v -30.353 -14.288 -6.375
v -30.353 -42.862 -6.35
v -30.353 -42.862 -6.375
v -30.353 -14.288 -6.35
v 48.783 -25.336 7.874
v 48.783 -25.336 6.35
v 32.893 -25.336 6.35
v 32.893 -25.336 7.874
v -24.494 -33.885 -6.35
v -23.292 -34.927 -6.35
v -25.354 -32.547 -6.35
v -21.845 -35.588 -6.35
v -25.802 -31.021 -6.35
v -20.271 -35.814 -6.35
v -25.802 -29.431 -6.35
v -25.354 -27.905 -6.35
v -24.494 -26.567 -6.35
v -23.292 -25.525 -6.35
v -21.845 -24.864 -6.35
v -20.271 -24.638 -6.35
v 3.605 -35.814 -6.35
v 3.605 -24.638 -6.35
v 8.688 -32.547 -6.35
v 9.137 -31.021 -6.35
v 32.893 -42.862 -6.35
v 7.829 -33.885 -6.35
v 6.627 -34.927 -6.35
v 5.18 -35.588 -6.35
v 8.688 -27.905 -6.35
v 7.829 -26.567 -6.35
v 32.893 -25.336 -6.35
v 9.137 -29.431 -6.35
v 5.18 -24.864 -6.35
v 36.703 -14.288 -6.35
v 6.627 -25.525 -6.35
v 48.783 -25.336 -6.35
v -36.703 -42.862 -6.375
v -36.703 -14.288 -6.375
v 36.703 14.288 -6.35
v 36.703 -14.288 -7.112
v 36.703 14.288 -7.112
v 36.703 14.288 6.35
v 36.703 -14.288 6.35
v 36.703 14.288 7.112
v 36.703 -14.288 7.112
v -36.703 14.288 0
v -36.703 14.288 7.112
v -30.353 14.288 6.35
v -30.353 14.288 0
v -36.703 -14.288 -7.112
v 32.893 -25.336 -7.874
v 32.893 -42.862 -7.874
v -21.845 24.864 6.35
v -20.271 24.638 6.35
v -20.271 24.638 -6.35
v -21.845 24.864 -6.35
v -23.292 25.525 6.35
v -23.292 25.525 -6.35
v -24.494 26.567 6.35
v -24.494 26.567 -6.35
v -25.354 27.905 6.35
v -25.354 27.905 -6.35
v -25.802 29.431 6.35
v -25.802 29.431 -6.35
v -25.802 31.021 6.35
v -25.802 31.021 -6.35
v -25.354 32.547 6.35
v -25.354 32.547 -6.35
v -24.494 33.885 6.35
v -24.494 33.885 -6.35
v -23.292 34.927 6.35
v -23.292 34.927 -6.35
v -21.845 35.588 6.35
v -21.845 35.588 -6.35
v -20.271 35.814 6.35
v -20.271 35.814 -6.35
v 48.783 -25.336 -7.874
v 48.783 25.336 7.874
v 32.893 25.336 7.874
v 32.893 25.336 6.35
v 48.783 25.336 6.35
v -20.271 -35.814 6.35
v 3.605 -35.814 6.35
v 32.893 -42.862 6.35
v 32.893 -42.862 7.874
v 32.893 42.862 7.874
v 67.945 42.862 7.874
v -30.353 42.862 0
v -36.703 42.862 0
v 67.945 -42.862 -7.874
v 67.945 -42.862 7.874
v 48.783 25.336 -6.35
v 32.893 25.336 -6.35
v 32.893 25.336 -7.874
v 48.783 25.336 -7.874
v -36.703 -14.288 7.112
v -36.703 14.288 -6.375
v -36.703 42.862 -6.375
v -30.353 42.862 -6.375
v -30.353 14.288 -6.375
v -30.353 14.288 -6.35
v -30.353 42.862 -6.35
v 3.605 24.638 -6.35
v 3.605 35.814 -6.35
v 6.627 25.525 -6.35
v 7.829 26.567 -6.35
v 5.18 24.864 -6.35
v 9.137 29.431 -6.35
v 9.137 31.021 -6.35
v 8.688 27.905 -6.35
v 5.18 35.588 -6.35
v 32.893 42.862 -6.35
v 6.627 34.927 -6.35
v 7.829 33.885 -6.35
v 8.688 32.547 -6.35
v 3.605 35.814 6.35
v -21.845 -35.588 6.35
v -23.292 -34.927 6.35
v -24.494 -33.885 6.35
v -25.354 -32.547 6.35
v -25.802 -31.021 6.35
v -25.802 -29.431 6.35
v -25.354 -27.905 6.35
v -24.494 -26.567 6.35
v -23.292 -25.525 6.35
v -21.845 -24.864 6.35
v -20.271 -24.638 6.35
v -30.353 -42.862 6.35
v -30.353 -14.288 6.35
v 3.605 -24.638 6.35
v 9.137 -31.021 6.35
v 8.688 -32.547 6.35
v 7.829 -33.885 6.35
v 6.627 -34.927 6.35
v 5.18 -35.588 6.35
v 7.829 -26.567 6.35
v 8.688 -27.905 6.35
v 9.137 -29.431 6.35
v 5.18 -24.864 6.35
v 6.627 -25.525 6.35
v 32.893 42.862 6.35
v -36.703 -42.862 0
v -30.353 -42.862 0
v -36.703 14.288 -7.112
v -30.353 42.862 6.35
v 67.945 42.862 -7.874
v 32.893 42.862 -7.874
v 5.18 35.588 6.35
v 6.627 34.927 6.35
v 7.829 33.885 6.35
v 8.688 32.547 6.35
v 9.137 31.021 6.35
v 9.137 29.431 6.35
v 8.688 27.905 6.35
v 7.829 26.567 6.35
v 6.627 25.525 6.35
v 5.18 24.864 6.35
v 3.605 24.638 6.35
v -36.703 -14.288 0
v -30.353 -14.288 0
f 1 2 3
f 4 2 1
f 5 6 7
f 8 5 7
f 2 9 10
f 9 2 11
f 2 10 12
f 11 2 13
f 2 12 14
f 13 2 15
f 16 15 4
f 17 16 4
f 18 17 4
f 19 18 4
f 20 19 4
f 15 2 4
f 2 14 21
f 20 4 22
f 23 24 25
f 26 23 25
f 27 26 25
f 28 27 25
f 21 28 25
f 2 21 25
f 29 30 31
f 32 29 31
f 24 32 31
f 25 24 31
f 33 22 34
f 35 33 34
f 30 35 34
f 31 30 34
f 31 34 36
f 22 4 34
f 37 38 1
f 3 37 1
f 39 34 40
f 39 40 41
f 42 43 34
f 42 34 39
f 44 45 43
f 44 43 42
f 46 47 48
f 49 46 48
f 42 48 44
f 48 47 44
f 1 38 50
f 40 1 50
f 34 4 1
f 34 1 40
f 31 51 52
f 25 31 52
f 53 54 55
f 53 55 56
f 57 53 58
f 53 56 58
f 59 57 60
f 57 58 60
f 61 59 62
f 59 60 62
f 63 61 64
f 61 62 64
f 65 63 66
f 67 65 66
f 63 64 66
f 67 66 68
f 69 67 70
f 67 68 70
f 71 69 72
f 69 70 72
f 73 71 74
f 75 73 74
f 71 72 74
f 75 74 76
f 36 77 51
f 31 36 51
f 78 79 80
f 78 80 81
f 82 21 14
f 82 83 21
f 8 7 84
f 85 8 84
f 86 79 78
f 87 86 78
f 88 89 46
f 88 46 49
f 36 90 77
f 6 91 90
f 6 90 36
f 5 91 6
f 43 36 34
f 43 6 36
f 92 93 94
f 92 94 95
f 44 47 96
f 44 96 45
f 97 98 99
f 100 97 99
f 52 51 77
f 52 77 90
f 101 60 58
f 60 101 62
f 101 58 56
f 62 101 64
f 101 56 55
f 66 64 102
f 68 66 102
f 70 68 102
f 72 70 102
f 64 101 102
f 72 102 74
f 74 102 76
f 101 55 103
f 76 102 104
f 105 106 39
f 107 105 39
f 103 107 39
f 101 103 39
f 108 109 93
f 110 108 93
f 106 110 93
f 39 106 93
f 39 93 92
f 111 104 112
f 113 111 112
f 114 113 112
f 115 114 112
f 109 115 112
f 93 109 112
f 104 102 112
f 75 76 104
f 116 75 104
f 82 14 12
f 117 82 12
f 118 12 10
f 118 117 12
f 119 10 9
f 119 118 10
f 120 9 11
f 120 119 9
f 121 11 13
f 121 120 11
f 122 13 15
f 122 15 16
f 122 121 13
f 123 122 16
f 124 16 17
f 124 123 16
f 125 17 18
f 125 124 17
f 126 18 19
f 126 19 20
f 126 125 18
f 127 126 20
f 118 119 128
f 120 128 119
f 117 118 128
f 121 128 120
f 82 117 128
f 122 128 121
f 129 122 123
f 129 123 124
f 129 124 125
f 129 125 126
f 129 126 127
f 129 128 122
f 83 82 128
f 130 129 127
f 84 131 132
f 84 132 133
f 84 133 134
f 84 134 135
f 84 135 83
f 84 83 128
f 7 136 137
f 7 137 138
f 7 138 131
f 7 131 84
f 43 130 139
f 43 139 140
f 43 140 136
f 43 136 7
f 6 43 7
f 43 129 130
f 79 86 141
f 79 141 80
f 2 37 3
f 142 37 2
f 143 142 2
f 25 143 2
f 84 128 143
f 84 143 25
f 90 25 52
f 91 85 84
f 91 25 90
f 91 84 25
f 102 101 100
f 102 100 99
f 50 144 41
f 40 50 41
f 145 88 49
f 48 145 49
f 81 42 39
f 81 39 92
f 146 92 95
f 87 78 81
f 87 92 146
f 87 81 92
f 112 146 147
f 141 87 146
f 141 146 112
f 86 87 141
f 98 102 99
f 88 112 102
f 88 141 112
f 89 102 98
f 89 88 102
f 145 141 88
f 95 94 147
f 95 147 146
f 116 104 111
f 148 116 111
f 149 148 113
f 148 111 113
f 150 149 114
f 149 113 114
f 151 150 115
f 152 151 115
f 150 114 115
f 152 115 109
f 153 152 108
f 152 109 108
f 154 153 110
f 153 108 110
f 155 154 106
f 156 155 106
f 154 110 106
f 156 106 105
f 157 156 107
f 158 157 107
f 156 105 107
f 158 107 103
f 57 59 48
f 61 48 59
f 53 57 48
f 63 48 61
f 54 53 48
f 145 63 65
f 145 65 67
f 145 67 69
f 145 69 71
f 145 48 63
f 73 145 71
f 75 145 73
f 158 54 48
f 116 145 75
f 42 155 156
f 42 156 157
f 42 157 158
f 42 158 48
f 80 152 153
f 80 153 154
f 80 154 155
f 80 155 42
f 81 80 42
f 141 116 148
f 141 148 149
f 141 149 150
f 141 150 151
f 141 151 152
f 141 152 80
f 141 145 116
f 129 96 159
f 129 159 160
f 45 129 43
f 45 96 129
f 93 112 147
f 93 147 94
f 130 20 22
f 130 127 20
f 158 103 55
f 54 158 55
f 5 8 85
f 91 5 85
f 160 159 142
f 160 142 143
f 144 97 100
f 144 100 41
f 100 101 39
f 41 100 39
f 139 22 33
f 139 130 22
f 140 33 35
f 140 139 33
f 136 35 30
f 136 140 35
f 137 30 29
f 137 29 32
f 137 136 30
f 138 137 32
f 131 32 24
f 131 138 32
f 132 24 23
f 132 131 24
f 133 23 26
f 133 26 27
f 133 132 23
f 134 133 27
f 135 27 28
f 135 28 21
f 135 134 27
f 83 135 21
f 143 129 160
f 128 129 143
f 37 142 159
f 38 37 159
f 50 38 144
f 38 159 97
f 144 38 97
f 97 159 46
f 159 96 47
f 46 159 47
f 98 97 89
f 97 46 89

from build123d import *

# Parameters (mm, degrees)
F0_W     = 73.406
F0_H     = 28.575
F2_DEPTH = 7.112
F3_DEPTH = 6.35
F1_W     = 6.35
F1_H     = 28.575
F4_DEPTH = 6.3754
F5_DEPTH = 7.874


with BuildPart() as f2:
    # F0 (on Top) → F2 (new body, symmetric)
    with BuildSketch(Plane.XY):
        Rectangle(F0_W, F0_H)
    extrude(amount=F2_DEPTH, both=True)

    # F1 (on Top) → F3 (join, symmetric)
    with BuildSketch(Plane.XY):
        Polygon((-30.353, 42.8625), (-30.353, 14.2875), (36.703, 14.2875), (48.78324, 25.3365), (32.893, 25.3365), (32.893, 42.8625), align=None)
        with BuildLine():
            ThreePointArc((-20.270586, 24.638), (-25.858586, 30.226), (-20.270586, 35.814))
            Line((-20.270586, 35.814), (3.605414, 35.814))
            ThreePointArc((3.605414, 35.814), (9.193414, 30.226), (3.605414, 24.638))
            Line((3.605414, 24.638), (-20.270586, 24.638))
        make_face(mode=Mode.SUBTRACT)
        Polygon((36.703, -14.2875), (-30.353, -14.2875), (-30.353, -42.8625), (32.893, -42.8625), (32.893, -25.3365), (48.78324, -25.3365), align=None)
        with BuildLine():
            ThreePointArc((-20.270586, -35.814), (-25.858586, -30.226), (-20.270586, -24.638))
            Line((-20.270586, -24.638), (3.605414, -24.638))
            ThreePointArc((3.605414, -24.638), (9.193414, -30.226), (3.605414, -35.814))
            Line((3.605414, -35.814), (-20.270586, -35.814))
        make_face(mode=Mode.SUBTRACT)
    extrude(amount=F3_DEPTH, both=True)

    # F1 (on Top) → F4 (join)
    with BuildSketch(Plane.XY):
        with Locations((-33.528, -28.575)):
            Rectangle(F1_W, F1_H)
        with Locations((-33.528, 28.575)):
            Rectangle(F1_W, F1_H)
    extrude(amount=-F4_DEPTH)

    # F1 (on Top) → F5 (join, symmetric)
    with BuildSketch(Plane.XY):
        Polygon((32.893, -25.3365), (32.893, -42.8625), (67.945, -42.8625), (48.78324, -25.3365), align=None)
        Polygon((67.945, 42.8625), (32.893, 42.8625), (32.893, 25.3365), (48.78324, 25.3365), align=None)
    extrude(amount=F5_DEPTH, both=True)


solid = f2.part
